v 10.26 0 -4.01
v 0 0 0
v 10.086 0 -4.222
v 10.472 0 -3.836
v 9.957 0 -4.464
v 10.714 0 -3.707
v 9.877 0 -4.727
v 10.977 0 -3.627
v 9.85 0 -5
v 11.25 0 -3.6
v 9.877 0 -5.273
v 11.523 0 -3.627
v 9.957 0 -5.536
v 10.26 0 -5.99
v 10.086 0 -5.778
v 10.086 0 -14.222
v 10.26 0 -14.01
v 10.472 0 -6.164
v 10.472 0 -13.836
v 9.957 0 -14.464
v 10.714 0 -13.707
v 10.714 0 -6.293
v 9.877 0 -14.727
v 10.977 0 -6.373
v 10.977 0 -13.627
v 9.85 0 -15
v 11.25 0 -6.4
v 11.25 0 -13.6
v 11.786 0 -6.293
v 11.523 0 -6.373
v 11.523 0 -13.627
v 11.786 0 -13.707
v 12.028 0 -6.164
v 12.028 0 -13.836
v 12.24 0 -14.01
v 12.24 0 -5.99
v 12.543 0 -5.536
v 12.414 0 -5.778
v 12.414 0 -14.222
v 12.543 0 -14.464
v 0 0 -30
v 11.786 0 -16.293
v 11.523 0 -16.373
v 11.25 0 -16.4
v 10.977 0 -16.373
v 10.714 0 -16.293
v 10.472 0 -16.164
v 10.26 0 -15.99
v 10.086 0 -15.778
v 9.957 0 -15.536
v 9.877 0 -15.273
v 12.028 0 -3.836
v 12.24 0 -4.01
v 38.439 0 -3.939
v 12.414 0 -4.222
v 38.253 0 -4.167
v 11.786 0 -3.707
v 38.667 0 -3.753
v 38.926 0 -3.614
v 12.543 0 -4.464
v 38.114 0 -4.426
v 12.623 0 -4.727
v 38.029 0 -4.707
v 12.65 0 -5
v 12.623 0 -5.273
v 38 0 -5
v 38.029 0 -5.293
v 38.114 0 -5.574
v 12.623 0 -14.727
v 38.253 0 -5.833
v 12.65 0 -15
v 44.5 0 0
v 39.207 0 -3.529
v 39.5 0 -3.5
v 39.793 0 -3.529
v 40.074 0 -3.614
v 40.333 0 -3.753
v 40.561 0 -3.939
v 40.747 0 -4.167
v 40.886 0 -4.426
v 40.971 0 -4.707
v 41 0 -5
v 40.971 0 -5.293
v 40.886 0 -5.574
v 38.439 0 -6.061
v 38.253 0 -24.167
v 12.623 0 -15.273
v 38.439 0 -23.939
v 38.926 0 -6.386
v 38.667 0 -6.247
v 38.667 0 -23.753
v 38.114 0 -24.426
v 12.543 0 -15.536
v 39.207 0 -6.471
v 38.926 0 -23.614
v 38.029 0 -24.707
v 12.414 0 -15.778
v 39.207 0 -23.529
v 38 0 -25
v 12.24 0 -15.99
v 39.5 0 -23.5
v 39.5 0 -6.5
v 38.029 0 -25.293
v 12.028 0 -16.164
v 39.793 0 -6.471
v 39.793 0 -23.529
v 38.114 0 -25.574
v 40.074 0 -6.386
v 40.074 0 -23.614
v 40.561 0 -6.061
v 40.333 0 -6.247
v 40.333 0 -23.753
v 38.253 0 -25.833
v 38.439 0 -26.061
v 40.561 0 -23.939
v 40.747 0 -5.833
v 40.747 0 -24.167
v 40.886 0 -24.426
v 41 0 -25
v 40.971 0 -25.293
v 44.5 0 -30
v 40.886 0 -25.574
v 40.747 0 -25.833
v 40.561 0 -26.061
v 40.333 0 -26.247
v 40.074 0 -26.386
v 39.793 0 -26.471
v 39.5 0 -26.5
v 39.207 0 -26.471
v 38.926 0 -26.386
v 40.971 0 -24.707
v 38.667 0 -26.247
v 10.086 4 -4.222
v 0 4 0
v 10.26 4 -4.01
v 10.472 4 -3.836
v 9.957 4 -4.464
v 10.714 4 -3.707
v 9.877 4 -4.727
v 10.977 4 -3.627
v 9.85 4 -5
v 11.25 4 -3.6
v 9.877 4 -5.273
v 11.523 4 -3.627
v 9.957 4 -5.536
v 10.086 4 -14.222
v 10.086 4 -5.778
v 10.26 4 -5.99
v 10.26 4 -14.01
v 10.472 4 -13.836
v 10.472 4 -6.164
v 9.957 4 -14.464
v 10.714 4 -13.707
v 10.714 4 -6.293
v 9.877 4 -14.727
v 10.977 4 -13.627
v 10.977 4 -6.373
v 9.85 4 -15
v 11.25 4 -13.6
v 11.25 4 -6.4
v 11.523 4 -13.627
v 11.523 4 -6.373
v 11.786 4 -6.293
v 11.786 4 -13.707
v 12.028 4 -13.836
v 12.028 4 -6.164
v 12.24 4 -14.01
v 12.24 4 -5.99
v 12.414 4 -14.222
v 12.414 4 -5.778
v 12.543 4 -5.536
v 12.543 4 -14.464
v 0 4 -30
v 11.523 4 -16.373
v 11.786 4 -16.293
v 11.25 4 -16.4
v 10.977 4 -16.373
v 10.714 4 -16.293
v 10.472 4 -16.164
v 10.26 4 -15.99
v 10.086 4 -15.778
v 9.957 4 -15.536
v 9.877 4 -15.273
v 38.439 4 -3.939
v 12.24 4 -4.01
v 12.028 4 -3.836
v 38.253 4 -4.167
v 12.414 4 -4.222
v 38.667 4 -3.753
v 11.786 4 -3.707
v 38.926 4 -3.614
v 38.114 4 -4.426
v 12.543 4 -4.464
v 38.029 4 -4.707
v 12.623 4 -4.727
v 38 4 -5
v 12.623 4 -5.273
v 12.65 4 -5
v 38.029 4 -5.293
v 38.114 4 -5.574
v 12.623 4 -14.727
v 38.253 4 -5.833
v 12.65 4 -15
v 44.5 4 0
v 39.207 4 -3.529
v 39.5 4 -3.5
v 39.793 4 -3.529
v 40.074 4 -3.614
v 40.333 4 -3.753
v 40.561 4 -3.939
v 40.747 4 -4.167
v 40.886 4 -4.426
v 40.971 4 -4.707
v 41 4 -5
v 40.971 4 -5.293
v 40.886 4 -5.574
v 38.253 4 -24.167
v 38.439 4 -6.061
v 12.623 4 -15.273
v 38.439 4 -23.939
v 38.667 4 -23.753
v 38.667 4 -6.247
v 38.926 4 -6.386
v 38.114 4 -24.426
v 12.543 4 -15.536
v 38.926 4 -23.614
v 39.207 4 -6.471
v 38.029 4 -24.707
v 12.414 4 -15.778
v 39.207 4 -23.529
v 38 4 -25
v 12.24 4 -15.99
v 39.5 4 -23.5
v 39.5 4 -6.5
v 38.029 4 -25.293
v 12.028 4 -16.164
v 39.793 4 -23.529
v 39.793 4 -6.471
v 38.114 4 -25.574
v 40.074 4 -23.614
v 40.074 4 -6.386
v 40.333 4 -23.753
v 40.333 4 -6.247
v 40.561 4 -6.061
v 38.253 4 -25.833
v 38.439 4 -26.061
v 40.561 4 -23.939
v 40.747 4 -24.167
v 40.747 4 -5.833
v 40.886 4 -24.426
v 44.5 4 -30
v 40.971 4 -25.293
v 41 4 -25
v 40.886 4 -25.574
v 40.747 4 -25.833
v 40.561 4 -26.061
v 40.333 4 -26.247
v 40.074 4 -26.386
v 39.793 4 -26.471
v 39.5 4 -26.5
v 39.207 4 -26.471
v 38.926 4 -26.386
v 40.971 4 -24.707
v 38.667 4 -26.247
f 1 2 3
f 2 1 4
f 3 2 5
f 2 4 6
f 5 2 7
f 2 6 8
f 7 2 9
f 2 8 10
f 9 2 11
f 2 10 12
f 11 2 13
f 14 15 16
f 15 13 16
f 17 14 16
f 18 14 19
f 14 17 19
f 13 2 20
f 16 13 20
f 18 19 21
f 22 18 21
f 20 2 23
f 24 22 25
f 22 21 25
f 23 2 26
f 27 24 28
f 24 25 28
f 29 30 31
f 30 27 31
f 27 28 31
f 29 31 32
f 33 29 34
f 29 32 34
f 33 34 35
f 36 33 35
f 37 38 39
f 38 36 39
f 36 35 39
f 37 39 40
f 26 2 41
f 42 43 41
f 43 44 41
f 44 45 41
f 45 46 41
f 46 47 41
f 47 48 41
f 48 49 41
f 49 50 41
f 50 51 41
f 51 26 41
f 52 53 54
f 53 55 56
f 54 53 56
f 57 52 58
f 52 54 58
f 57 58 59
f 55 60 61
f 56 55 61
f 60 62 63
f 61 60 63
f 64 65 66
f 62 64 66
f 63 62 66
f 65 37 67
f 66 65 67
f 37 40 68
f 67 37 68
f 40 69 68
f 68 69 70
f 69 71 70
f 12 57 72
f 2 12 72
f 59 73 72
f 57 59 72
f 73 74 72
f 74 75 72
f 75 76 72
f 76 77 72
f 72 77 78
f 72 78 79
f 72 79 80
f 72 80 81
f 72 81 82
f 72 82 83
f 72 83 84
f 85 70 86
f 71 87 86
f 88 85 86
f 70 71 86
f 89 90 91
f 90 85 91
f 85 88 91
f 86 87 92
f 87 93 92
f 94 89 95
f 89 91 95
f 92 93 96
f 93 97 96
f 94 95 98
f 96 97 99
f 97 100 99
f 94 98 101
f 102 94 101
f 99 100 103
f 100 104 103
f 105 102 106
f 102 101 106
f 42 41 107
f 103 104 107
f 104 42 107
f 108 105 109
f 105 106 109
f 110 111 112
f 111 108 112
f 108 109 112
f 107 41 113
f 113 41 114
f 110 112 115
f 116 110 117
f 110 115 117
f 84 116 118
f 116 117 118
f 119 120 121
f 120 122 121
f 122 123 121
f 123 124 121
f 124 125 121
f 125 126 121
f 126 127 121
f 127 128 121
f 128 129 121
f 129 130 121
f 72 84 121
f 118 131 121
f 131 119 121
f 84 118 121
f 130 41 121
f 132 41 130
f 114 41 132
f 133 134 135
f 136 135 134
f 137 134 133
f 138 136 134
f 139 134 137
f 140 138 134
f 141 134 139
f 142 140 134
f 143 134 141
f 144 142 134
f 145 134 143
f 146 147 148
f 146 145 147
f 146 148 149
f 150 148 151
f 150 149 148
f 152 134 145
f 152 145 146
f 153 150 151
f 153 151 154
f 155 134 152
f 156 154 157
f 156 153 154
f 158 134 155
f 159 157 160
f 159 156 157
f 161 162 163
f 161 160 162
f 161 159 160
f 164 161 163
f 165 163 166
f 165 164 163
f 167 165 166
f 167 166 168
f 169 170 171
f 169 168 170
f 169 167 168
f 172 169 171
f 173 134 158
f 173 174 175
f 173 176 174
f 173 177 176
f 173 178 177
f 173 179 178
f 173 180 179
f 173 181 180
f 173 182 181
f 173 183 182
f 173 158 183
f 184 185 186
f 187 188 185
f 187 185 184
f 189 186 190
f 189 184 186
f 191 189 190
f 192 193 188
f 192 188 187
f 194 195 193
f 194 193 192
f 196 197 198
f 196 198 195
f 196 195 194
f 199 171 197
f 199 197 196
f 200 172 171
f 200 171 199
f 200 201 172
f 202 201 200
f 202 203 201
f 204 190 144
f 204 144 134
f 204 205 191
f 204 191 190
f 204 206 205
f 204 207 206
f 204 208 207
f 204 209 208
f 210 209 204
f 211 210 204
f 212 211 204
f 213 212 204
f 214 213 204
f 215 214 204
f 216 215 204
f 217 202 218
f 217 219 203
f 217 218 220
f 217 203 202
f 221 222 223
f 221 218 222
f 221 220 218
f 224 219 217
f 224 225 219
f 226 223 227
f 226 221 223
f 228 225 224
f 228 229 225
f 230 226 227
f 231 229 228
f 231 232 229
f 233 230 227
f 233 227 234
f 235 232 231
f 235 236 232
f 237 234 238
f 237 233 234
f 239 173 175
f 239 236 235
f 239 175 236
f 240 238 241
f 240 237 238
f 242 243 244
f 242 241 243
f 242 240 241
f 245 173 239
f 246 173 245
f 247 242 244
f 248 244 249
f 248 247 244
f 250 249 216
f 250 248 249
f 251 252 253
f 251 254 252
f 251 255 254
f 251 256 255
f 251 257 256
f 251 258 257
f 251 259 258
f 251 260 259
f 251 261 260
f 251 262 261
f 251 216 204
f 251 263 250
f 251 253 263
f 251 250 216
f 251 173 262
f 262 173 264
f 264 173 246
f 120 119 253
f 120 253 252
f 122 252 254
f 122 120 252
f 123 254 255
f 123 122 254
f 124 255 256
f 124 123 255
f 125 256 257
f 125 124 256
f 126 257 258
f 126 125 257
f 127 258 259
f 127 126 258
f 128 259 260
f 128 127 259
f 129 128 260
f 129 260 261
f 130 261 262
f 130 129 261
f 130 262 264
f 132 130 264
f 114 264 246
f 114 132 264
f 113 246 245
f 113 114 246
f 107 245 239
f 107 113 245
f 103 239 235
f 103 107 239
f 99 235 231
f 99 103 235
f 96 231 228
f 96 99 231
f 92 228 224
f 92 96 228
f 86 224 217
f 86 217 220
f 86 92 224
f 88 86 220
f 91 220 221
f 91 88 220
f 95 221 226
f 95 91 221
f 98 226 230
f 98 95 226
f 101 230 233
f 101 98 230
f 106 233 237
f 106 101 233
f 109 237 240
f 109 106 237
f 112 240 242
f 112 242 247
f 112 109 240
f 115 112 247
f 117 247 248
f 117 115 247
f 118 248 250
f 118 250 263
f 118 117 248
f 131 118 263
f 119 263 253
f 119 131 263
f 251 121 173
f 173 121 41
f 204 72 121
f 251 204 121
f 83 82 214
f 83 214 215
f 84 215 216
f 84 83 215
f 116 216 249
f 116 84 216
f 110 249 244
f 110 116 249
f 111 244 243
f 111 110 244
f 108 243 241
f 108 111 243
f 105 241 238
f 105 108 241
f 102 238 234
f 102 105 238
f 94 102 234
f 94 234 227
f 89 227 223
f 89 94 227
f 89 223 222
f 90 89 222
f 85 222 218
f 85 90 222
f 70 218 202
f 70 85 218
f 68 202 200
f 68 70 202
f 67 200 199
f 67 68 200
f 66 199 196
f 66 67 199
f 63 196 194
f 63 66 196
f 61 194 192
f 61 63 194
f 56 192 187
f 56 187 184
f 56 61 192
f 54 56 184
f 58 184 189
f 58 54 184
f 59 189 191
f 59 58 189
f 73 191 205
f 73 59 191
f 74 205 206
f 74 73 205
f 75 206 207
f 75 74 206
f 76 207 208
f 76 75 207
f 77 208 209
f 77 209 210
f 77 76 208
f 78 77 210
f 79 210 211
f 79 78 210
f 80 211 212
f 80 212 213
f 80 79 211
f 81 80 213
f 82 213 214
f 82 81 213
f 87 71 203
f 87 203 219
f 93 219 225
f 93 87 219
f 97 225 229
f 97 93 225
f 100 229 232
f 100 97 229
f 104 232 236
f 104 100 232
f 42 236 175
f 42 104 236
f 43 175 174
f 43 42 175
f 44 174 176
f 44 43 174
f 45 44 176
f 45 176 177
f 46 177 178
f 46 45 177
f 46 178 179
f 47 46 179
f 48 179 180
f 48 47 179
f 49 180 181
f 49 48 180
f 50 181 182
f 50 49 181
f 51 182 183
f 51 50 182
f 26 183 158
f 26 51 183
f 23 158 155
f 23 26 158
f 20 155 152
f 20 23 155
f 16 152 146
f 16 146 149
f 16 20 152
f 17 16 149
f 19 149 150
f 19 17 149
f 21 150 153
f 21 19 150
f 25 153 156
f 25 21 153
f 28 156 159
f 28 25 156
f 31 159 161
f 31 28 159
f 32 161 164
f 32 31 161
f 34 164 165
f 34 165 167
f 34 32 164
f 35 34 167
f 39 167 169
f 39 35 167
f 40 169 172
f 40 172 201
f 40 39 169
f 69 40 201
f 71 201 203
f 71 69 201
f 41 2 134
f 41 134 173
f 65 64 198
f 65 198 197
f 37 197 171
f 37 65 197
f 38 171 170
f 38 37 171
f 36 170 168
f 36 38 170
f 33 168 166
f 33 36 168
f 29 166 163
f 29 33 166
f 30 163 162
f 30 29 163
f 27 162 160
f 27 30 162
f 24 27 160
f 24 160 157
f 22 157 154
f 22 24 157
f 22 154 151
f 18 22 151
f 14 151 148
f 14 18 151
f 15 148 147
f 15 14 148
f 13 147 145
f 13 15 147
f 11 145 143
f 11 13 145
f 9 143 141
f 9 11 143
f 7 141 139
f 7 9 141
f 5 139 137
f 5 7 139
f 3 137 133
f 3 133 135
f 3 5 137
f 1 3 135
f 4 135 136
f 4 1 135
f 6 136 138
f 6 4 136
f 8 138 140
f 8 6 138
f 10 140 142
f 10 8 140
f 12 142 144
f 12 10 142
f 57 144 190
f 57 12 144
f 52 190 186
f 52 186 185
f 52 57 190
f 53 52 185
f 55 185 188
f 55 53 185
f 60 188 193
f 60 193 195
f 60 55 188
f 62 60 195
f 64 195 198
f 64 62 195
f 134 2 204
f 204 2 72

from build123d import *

# Parameters (mm, degrees)
SKETCH1_W           = 22.5
SKETCH1_H           = 30
SKETCH1_R           = 1.4
SKETCH1_W_2         = 22
SKETCH1_R_2         = 1.5
BOSS_EXTRUDE1_DEPTH = 4


with BuildPart() as part:
    # Sketch1 → Boss-Extrude1 (new body)
    with BuildSketch(Plane(origin=(0, 0, 0), x_dir=(1, 0, 0), z_dir=(0, 1, 0))):
        with Locations((11.25, 15)):
            Rectangle(SKETCH1_W, SKETCH1_H)
        with Locations((11.25, 5)):
            Circle(SKETCH1_R, mode=Mode.SUBTRACT)
        with Locations((11.25, 15)):
            Circle(SKETCH1_R, mode=Mode.SUBTRACT)
        with Locations((33.5, 15)):
            Rectangle(SKETCH1_W_2, SKETCH1_H)
        with Locations((39.5, 5)):
            Circle(SKETCH1_R_2, mode=Mode.SUBTRACT)
        with Locations((39.5, 25)):
            Circle(SKETCH1_R_2, mode=Mode.SUBTRACT)
    extrude(amount=BOSS_EXTRUDE1_DEPTH)


solid = part.part
